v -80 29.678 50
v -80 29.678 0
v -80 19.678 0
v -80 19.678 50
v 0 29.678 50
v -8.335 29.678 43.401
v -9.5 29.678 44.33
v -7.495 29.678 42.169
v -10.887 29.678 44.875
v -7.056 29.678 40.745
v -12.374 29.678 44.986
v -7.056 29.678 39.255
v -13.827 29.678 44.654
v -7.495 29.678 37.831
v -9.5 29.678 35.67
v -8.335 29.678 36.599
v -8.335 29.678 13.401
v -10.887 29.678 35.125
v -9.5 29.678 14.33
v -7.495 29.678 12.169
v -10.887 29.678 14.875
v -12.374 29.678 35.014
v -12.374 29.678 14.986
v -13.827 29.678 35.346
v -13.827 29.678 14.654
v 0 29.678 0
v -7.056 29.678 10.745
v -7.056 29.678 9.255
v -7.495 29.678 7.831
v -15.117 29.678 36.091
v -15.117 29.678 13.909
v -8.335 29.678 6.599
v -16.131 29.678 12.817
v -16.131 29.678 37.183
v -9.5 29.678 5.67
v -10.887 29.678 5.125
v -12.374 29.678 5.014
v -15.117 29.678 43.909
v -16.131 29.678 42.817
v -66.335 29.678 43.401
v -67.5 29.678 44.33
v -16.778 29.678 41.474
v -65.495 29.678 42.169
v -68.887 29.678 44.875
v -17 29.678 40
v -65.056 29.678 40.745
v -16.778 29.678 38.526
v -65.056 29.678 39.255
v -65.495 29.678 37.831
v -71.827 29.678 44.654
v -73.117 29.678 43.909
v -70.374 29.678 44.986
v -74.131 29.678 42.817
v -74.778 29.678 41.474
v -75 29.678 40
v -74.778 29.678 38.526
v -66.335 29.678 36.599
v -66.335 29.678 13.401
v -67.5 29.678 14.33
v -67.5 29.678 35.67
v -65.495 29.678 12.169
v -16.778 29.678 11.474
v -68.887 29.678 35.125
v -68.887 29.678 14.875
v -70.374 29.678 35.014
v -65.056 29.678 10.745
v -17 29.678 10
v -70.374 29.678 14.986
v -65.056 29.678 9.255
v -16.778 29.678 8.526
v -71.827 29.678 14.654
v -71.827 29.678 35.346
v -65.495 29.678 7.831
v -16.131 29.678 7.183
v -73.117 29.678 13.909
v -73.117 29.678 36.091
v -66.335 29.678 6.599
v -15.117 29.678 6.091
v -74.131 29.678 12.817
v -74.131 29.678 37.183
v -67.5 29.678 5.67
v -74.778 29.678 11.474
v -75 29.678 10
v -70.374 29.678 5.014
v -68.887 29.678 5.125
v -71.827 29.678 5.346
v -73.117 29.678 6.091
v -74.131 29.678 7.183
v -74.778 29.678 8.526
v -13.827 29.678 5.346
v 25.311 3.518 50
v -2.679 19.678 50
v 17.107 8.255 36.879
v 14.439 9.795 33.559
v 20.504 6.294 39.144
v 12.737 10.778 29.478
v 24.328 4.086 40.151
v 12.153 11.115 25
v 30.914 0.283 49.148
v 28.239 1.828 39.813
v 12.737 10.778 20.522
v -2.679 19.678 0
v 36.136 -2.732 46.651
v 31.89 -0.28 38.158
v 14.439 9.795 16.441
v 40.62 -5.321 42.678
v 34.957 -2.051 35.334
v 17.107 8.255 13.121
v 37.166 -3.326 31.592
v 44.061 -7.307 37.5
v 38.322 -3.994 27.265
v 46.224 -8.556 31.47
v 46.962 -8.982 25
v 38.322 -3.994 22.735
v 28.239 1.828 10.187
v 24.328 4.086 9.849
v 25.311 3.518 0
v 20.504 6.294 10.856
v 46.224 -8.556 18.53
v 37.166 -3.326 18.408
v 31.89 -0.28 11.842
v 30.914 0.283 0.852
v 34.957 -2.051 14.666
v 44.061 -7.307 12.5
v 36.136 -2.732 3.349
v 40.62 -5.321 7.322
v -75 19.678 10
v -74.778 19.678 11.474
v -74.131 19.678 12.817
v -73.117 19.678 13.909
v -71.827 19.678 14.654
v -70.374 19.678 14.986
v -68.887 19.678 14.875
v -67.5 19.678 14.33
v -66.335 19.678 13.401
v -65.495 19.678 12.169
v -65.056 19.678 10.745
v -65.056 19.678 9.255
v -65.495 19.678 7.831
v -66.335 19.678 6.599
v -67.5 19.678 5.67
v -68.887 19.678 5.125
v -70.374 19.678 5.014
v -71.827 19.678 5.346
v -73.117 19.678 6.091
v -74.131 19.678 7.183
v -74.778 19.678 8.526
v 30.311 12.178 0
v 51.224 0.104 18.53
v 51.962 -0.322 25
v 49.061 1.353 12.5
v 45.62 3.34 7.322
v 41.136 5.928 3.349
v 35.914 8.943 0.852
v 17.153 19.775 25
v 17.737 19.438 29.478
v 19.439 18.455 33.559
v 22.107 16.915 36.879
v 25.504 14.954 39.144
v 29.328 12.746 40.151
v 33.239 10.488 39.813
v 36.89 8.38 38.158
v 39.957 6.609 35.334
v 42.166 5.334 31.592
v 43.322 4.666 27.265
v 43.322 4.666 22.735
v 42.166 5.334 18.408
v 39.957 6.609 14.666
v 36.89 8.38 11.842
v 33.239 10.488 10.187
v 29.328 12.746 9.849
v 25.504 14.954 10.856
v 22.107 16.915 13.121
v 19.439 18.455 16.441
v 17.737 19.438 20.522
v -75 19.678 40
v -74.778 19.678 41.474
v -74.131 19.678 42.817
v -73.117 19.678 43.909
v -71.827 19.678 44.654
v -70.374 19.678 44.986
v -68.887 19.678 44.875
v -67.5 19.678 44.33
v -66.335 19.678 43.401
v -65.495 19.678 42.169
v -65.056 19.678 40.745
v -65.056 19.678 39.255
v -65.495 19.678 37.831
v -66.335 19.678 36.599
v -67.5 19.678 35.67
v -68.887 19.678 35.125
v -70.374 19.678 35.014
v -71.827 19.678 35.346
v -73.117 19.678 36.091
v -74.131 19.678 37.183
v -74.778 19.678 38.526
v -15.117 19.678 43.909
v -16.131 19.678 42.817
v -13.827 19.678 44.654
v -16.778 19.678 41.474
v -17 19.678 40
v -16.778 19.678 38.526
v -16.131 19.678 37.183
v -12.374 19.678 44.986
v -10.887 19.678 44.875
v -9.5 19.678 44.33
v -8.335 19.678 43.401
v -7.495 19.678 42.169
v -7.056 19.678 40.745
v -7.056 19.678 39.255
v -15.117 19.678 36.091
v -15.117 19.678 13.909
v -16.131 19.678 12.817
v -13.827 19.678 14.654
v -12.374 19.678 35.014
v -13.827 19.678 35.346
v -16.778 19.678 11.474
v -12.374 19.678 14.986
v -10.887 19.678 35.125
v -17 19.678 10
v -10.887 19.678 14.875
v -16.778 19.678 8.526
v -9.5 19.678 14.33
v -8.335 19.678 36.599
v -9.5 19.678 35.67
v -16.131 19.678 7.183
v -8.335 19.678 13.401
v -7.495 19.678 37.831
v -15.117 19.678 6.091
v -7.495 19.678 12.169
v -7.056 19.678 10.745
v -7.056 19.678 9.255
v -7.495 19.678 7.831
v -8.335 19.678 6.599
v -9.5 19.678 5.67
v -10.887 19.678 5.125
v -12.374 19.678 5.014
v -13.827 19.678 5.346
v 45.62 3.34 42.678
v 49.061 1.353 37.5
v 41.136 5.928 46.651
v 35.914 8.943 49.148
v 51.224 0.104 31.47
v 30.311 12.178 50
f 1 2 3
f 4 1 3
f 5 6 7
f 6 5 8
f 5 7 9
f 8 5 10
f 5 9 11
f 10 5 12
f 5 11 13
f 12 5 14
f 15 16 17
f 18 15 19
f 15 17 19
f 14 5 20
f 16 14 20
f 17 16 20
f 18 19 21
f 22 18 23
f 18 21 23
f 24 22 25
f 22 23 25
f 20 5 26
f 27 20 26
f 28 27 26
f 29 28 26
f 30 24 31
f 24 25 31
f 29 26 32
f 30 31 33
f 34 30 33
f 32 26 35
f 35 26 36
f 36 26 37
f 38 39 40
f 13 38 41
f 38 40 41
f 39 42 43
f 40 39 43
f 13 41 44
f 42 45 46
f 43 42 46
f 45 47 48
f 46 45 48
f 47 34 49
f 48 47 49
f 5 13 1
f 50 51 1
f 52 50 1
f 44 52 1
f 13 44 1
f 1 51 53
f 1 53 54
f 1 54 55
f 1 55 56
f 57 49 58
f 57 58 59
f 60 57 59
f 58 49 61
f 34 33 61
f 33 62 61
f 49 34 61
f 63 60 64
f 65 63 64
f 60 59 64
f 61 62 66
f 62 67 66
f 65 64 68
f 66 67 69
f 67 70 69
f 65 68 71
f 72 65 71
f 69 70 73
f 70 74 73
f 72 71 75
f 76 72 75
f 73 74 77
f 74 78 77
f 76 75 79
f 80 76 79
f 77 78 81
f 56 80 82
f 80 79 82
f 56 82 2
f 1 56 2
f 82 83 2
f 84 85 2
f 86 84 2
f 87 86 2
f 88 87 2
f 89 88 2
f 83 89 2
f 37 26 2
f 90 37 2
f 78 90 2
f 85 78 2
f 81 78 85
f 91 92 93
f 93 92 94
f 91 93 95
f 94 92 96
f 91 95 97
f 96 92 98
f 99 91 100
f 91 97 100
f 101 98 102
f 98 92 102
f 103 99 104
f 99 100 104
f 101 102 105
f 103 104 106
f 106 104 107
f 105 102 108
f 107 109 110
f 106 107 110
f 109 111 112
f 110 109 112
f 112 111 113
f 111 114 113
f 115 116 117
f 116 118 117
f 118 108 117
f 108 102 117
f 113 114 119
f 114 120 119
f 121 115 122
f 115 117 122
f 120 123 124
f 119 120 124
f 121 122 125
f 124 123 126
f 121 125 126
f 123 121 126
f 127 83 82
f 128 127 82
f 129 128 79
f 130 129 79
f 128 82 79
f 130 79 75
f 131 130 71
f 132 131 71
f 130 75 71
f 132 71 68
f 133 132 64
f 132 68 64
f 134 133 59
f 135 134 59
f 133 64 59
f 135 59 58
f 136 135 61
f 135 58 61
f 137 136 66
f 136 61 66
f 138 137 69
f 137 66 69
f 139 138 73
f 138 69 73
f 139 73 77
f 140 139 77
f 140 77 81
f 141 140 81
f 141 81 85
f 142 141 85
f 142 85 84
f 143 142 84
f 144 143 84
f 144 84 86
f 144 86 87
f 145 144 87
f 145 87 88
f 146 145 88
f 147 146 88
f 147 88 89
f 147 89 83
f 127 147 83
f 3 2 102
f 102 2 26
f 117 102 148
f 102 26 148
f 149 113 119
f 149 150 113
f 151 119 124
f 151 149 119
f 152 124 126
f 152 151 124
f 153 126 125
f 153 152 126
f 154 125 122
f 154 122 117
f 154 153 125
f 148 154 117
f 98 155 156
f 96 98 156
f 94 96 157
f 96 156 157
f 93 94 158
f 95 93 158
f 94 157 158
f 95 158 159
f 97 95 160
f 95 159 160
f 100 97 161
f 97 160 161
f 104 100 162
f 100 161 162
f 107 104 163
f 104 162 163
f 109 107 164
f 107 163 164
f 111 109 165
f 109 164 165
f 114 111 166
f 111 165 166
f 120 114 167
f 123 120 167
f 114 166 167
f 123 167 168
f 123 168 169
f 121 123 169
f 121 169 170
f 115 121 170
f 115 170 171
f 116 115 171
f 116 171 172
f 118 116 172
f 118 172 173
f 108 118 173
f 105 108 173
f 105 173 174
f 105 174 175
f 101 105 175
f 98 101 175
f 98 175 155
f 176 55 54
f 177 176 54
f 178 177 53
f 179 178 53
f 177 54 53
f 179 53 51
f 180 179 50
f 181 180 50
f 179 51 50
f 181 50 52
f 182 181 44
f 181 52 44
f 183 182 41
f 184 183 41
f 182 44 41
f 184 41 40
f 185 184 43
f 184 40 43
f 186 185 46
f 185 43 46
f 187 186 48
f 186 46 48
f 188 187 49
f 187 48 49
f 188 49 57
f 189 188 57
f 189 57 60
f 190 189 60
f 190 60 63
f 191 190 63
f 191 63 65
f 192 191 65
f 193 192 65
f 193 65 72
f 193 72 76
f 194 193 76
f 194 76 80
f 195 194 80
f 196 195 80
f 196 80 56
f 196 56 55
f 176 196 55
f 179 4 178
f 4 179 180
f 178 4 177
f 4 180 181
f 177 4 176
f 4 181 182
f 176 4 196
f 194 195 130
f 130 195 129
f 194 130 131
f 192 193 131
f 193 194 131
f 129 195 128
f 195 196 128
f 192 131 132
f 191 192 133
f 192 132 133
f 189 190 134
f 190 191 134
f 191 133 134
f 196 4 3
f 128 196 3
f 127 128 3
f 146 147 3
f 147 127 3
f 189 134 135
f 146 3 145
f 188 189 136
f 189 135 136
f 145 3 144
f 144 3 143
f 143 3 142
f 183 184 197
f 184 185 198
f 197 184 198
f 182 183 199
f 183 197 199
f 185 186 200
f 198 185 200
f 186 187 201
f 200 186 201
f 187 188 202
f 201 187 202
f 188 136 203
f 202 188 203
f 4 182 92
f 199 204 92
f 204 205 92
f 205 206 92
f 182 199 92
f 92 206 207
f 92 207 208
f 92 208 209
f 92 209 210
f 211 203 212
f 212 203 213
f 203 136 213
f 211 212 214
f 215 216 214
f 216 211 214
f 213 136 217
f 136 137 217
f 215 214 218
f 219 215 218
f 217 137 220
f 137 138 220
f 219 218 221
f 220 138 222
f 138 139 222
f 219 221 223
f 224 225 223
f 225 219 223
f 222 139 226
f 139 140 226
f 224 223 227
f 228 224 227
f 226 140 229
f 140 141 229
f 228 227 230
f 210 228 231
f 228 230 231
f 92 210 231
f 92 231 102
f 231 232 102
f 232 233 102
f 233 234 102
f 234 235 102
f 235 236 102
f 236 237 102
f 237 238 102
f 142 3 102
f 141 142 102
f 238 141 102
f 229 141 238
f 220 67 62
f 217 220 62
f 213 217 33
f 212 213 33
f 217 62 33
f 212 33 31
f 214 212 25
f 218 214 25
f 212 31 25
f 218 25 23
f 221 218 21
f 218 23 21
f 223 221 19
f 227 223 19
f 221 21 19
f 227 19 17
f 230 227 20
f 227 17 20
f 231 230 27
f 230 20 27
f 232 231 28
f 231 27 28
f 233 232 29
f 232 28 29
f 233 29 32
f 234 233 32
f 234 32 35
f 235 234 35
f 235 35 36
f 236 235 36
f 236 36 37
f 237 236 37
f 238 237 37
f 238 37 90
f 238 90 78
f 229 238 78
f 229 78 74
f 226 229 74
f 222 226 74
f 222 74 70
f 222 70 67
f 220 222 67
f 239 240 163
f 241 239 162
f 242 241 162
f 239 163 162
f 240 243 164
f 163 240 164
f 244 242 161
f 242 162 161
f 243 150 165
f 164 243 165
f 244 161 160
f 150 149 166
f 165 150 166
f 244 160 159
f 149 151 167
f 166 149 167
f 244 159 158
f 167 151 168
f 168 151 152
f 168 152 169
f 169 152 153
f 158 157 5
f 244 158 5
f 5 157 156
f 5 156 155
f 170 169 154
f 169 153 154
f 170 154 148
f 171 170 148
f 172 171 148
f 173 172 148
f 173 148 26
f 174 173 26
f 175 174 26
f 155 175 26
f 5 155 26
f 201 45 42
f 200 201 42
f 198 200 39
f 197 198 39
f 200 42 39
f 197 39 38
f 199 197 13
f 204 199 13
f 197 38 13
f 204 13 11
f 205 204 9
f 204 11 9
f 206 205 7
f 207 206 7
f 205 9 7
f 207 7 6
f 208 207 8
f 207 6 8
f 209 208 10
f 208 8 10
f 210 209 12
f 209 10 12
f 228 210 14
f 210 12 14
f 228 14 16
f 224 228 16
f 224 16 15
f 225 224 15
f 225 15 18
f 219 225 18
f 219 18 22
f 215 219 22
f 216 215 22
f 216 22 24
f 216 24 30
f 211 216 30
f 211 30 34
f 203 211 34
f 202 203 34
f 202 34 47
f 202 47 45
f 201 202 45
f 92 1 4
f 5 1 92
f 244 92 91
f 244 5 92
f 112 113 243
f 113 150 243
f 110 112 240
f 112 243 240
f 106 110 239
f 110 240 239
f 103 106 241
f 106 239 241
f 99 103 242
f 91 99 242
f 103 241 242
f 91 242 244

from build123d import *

# Parameters (mm, degrees)
F1_DEPTH = 50
F2_R     = 24.99999
F3_R     = 15.1938434026
F4_DEPTH = 73.4817621135
F5_R     = 5
F6_DEPTH = 38.6612540378


# Not quite as in the source:
# - a fillet or chamfer is up to 0.001 mm smaller than in the source, because OpenCascade refuses the exact size


with BuildPart() as f1:
    # F0 (on Top) → F1 (new body)
    with BuildSketch(Plane.XY):
        Polygon((0, 29.6784242139), (-80, 29.6784242139), (-80, 19.6784242139), (-2.6794919243, 19.6784242139), (46.9615242271, -8.9818298239), (51.9615242271, -0.3215757861), align=None)
    extrude(amount=F1_DEPTH)

    # F2 (radius 25 in the source; OpenCascade refuses exactly that, so slightly less here)
    f2_edges = [f1.edges().sort_by_distance(p)[0] for p in [
        (49.461524, -4.651703, 50),
        (49.461524, -4.651703, 0),
    ]]
    fillet(f2_edges, radius=F2_R)

    # F3 (on face) → F4 (cut, through all)
    with BuildSketch(Plane(origin=(12.8511346568, 22.2588181604, 0), x_dir=(-0.8660254038, 0.5, 0), z_dir=(0.5, 0.8660254038, 0))):
        with Locations((-20.160787893, 25)):
            Circle(F3_R)
    extrude(amount=-F4_DEPTH, mode=Mode.SUBTRACT)

    # F5 (on face) → F6 (cut, through all)
    with BuildSketch(Plane(origin=(0, 29.6784242139, 0), x_dir=(-1, 0, 0), z_dir=(0, 1, 0))):
        with Locations((12, 40)):
            Circle(F5_R)
        with Locations((70, 40)):
            Circle(F5_R)
        with Locations((12, 10)):
            Circle(F5_R)
        with Locations((70, 10)):
            Circle(F5_R)
    extrude(amount=-F6_DEPTH, mode=Mode.SUBTRACT)


solid = f1.part
